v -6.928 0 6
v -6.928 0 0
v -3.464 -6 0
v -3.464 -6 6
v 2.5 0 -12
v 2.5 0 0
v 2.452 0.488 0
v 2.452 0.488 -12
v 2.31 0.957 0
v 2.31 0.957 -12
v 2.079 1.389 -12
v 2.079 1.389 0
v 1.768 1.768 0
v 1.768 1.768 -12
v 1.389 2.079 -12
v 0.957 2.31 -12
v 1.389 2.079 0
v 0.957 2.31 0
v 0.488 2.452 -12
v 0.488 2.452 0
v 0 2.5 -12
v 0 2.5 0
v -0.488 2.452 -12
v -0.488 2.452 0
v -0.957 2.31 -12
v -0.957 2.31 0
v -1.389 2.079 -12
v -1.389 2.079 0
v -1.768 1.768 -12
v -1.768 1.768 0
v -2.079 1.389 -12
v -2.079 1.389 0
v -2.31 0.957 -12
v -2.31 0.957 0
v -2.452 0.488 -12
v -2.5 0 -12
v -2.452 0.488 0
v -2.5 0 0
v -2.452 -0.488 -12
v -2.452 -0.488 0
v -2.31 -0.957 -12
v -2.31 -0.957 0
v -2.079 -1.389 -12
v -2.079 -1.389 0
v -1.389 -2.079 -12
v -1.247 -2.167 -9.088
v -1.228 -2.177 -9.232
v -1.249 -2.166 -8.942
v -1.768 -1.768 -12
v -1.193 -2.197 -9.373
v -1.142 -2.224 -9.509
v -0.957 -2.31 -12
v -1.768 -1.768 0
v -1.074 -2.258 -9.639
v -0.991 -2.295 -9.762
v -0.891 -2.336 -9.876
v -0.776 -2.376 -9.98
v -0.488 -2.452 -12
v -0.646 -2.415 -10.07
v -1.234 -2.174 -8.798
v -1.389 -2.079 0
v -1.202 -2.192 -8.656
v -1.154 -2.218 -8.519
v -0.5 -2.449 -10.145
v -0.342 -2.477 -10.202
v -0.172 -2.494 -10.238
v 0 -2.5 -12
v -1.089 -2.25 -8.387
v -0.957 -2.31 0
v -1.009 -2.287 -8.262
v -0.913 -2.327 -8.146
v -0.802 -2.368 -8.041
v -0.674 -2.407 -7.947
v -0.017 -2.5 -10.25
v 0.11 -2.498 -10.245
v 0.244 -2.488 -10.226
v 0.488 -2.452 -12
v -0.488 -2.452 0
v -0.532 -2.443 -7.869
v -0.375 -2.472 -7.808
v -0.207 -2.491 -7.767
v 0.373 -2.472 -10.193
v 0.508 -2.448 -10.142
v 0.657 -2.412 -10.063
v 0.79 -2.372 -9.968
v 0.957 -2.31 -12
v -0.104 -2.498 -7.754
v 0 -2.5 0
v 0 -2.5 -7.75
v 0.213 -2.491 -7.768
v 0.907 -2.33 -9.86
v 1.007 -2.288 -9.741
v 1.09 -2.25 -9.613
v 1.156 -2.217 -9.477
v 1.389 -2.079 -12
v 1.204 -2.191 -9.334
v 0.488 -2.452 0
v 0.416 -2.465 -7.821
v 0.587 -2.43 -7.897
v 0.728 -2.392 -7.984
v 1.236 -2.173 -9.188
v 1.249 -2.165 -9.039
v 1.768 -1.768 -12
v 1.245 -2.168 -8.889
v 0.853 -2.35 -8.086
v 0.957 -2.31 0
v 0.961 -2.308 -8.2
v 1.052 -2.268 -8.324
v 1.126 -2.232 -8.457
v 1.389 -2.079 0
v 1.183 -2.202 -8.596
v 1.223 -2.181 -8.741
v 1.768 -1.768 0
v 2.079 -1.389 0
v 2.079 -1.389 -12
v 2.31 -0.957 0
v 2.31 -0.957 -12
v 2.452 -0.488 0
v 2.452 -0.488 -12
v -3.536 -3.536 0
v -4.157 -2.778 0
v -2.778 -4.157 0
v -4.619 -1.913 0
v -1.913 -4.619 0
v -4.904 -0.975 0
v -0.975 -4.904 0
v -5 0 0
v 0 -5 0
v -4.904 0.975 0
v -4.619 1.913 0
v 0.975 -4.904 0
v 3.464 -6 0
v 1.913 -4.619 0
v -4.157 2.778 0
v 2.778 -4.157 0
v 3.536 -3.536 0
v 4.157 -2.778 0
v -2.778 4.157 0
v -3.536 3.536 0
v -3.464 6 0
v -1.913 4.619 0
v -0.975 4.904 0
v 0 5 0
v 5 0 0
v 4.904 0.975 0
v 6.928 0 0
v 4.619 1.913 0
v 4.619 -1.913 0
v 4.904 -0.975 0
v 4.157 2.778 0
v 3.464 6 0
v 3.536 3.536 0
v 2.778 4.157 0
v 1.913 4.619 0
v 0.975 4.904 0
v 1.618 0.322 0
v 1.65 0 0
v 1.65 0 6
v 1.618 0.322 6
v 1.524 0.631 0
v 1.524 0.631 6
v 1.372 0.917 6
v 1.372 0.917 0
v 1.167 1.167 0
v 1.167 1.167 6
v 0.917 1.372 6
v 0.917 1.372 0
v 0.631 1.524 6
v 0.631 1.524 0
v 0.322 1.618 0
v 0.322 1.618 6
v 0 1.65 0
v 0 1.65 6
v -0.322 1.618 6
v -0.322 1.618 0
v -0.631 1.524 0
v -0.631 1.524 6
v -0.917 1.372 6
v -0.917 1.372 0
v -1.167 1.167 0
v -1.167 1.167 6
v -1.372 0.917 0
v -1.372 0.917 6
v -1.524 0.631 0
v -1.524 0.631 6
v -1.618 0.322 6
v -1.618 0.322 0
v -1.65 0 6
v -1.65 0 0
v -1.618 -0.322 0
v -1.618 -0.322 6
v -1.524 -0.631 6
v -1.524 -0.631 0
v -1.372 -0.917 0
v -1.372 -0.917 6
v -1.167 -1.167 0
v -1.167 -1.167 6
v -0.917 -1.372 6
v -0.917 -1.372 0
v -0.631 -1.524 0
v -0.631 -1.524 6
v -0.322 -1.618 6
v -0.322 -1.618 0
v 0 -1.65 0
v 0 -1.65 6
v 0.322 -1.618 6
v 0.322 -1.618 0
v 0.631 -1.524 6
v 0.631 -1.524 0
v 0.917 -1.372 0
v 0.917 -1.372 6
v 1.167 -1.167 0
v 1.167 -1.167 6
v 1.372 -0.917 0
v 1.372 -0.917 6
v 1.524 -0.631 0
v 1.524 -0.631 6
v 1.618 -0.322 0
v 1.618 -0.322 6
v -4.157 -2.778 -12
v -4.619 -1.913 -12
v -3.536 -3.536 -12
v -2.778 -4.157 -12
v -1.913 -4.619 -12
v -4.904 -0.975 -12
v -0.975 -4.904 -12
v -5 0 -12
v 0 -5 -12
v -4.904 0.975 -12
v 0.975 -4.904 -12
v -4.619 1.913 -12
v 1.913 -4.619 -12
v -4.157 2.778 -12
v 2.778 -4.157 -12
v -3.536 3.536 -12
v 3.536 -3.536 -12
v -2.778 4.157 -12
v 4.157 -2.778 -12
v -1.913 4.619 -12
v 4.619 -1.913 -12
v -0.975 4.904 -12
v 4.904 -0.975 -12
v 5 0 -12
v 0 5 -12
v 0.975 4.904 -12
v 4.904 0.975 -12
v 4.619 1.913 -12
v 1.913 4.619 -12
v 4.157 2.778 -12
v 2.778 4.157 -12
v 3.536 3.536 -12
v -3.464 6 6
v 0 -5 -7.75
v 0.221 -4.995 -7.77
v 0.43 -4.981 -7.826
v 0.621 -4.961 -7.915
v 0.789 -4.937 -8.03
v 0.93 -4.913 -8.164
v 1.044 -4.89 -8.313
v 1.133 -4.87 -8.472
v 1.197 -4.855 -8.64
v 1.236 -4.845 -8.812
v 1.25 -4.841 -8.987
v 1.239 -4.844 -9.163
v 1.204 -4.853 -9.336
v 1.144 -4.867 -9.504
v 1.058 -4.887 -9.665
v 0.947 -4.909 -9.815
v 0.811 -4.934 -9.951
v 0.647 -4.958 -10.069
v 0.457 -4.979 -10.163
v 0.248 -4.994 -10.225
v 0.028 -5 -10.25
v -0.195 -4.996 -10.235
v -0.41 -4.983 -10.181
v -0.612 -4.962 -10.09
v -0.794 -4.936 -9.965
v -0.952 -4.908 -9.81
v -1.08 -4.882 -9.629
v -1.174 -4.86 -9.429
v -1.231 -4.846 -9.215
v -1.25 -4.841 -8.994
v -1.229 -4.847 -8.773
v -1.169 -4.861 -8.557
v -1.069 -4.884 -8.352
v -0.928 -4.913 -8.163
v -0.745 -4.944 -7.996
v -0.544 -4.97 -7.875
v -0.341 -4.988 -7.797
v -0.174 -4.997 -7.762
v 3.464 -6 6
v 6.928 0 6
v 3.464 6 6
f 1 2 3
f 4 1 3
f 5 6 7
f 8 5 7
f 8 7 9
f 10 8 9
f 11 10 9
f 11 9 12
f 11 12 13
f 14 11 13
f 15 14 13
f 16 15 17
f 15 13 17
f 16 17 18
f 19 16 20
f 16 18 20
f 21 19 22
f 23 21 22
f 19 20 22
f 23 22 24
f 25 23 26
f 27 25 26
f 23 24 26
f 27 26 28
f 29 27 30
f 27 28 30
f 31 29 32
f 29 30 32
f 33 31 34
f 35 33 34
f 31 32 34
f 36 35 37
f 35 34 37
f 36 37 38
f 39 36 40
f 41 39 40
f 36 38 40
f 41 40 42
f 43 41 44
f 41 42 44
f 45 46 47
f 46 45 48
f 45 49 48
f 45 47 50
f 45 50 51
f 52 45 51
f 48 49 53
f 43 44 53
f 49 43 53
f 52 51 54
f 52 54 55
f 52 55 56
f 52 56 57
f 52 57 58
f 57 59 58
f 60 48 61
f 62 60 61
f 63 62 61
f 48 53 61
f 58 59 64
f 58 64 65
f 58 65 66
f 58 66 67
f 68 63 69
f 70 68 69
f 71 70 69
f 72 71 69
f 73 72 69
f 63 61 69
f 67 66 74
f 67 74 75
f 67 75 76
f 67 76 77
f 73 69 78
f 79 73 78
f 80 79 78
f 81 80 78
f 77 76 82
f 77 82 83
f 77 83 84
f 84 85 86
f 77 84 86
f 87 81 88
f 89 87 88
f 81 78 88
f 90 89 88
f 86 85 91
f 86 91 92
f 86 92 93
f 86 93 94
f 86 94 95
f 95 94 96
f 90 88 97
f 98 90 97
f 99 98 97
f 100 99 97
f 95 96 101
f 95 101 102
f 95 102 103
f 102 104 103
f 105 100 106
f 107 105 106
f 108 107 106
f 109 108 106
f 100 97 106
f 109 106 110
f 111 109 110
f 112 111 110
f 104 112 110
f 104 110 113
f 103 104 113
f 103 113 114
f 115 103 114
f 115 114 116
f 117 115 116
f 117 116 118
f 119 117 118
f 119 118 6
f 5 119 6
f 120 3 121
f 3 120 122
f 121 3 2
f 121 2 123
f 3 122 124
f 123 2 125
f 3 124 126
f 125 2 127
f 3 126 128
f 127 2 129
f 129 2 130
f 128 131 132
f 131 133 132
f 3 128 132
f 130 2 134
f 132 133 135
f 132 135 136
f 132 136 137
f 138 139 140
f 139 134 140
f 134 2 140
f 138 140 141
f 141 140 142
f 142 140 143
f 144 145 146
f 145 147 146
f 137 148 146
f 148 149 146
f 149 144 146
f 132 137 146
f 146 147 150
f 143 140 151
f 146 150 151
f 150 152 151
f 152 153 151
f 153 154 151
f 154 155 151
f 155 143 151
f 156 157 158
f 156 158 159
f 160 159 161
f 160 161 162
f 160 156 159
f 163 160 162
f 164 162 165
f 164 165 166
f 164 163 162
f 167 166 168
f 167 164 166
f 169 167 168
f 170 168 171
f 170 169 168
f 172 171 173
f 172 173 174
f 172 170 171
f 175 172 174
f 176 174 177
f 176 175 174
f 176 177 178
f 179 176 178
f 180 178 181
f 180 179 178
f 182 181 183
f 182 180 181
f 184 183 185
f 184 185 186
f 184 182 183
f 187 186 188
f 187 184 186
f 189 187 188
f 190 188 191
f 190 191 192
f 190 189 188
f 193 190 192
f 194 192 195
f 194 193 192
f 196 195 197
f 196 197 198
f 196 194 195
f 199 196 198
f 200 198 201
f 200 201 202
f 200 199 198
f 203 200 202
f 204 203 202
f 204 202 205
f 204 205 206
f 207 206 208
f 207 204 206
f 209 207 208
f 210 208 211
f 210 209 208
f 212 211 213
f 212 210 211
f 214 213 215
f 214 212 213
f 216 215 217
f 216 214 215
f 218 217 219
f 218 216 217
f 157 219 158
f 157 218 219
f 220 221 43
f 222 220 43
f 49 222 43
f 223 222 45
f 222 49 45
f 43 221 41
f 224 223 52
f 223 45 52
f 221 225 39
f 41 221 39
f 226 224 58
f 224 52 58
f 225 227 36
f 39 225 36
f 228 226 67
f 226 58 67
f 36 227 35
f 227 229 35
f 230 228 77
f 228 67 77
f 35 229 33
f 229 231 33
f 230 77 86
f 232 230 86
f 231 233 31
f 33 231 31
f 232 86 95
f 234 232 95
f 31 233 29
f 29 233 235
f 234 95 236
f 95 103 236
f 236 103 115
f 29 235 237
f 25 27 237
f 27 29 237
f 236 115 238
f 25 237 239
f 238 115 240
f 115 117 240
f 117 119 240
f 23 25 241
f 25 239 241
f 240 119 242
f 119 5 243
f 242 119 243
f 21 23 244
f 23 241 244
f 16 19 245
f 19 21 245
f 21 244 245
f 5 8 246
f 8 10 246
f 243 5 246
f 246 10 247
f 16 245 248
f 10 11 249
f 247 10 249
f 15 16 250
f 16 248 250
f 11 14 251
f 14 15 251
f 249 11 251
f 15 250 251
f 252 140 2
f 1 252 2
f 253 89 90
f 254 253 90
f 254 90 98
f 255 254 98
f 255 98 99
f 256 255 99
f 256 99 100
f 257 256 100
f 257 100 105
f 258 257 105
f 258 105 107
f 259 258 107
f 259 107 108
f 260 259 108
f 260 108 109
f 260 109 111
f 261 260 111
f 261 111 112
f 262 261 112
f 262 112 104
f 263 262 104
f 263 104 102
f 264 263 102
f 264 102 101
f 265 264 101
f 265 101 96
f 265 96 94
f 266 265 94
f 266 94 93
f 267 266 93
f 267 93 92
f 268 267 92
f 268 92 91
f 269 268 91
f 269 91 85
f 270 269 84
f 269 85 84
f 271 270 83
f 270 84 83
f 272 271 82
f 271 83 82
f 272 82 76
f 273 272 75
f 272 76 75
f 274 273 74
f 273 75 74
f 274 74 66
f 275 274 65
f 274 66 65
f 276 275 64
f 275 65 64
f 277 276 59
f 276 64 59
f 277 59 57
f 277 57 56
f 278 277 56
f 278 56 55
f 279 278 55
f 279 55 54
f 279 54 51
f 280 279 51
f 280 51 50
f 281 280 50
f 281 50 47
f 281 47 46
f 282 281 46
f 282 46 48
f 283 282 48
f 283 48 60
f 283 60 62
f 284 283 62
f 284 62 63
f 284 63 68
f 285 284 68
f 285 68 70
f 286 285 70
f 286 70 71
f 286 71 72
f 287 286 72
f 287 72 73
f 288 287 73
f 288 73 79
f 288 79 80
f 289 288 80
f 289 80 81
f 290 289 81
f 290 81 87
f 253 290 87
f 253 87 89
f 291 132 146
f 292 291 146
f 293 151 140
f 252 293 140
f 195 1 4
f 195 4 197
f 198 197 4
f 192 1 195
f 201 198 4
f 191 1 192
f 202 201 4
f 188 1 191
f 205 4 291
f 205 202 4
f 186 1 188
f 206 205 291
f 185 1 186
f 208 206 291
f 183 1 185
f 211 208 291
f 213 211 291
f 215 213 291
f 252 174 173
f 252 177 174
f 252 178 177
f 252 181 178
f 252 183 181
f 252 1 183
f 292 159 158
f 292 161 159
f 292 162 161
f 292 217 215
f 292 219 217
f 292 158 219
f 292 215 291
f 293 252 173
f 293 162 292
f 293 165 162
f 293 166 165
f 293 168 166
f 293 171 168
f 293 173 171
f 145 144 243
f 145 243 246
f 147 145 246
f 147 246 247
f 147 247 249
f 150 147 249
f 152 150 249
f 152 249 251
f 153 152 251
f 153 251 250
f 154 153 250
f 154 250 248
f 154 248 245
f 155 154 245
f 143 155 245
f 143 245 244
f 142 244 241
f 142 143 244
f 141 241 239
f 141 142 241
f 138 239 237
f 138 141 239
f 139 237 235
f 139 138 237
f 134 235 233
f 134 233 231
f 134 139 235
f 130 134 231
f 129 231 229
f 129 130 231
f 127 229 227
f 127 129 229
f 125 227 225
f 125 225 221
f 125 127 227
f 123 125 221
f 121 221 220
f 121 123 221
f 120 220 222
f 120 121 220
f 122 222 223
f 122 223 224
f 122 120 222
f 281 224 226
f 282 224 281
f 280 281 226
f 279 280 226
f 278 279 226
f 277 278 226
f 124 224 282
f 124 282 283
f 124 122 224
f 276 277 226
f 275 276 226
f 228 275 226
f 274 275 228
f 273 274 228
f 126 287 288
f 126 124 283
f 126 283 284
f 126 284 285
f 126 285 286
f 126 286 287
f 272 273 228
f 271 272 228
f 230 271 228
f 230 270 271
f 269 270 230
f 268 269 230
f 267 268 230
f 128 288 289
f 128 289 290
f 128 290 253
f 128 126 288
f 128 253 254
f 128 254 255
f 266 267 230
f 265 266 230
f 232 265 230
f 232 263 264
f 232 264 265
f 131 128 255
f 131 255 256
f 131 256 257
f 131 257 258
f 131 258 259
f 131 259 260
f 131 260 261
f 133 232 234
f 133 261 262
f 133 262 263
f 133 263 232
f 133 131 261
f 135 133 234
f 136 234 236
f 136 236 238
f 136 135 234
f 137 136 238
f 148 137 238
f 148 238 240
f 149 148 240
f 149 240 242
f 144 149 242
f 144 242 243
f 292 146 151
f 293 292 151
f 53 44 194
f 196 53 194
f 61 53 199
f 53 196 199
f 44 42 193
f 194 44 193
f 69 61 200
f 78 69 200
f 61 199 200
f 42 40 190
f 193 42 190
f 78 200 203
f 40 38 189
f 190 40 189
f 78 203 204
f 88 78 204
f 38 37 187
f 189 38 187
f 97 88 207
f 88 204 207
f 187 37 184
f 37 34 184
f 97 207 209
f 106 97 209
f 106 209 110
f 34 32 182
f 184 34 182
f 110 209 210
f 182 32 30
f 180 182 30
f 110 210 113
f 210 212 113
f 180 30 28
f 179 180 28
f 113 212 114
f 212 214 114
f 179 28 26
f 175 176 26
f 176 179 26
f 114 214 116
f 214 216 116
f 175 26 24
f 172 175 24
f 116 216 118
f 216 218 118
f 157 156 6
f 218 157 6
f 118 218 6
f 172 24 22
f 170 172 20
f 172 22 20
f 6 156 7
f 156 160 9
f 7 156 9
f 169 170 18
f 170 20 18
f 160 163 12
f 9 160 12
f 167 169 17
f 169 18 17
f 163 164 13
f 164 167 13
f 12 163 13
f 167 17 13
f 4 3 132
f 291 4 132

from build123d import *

# Parameters (mm, degrees)
BOSS_EXTRUDE1_DEPTH = 6
SKETCH2_R           = 5
BOSS_EXTRUDE2_DEPTH = 12
SKETCH3_R           = 2.5
CUT_EXTRUDE1_DEPTH  = 12
SKETCH4_R           = 1.65
CUT_EXTRUDE2_DEPTH  = 6
SKETCH5_R           = 1.25
CUT_EXTRUDE3_DEPTH  = 5.1


with BuildPart() as part:
    # Sketch1 → Boss-Extrude1 (new body)
    with BuildSketch(Plane.XY):
        Polygon((6.92820323, 0), (3.464101615, 6), (-3.464101615, 6), (-6.92820323, 0), (-3.464101615, -6), (3.464101615, -6), align=None)
    extrude(amount=BOSS_EXTRUDE1_DEPTH)

    # Sketch2 → Boss-Extrude2 (add)
    with BuildSketch(Plane.XY):
        Circle(SKETCH2_R)
    extrude(amount=-BOSS_EXTRUDE2_DEPTH)

    # Sketch3 → Cut-Extrude1 (cut)
    with BuildSketch(Plane.XY):
        Circle(SKETCH3_R)
    extrude(amount=-CUT_EXTRUDE1_DEPTH, mode=Mode.SUBTRACT)

    # Sketch4 → Cut-Extrude2 (cut)
    with BuildSketch(Plane.XY):
        Circle(SKETCH4_R)
    extrude(amount=CUT_EXTRUDE2_DEPTH, mode=Mode.SUBTRACT)

    # Sketch5 → Cut-Extrude3 (cut)
    with BuildSketch(Plane(origin=(0, 0, 0), x_dir=(1, 0, 0), z_dir=(0, 1, 0))):
        with Locations(Location((0, 9, 0), (0, 0, 270))):
            Circle(SKETCH5_R)
    extrude(amount=-CUT_EXTRUDE3_DEPTH, mode=Mode.SUBTRACT)


solid = part.part
